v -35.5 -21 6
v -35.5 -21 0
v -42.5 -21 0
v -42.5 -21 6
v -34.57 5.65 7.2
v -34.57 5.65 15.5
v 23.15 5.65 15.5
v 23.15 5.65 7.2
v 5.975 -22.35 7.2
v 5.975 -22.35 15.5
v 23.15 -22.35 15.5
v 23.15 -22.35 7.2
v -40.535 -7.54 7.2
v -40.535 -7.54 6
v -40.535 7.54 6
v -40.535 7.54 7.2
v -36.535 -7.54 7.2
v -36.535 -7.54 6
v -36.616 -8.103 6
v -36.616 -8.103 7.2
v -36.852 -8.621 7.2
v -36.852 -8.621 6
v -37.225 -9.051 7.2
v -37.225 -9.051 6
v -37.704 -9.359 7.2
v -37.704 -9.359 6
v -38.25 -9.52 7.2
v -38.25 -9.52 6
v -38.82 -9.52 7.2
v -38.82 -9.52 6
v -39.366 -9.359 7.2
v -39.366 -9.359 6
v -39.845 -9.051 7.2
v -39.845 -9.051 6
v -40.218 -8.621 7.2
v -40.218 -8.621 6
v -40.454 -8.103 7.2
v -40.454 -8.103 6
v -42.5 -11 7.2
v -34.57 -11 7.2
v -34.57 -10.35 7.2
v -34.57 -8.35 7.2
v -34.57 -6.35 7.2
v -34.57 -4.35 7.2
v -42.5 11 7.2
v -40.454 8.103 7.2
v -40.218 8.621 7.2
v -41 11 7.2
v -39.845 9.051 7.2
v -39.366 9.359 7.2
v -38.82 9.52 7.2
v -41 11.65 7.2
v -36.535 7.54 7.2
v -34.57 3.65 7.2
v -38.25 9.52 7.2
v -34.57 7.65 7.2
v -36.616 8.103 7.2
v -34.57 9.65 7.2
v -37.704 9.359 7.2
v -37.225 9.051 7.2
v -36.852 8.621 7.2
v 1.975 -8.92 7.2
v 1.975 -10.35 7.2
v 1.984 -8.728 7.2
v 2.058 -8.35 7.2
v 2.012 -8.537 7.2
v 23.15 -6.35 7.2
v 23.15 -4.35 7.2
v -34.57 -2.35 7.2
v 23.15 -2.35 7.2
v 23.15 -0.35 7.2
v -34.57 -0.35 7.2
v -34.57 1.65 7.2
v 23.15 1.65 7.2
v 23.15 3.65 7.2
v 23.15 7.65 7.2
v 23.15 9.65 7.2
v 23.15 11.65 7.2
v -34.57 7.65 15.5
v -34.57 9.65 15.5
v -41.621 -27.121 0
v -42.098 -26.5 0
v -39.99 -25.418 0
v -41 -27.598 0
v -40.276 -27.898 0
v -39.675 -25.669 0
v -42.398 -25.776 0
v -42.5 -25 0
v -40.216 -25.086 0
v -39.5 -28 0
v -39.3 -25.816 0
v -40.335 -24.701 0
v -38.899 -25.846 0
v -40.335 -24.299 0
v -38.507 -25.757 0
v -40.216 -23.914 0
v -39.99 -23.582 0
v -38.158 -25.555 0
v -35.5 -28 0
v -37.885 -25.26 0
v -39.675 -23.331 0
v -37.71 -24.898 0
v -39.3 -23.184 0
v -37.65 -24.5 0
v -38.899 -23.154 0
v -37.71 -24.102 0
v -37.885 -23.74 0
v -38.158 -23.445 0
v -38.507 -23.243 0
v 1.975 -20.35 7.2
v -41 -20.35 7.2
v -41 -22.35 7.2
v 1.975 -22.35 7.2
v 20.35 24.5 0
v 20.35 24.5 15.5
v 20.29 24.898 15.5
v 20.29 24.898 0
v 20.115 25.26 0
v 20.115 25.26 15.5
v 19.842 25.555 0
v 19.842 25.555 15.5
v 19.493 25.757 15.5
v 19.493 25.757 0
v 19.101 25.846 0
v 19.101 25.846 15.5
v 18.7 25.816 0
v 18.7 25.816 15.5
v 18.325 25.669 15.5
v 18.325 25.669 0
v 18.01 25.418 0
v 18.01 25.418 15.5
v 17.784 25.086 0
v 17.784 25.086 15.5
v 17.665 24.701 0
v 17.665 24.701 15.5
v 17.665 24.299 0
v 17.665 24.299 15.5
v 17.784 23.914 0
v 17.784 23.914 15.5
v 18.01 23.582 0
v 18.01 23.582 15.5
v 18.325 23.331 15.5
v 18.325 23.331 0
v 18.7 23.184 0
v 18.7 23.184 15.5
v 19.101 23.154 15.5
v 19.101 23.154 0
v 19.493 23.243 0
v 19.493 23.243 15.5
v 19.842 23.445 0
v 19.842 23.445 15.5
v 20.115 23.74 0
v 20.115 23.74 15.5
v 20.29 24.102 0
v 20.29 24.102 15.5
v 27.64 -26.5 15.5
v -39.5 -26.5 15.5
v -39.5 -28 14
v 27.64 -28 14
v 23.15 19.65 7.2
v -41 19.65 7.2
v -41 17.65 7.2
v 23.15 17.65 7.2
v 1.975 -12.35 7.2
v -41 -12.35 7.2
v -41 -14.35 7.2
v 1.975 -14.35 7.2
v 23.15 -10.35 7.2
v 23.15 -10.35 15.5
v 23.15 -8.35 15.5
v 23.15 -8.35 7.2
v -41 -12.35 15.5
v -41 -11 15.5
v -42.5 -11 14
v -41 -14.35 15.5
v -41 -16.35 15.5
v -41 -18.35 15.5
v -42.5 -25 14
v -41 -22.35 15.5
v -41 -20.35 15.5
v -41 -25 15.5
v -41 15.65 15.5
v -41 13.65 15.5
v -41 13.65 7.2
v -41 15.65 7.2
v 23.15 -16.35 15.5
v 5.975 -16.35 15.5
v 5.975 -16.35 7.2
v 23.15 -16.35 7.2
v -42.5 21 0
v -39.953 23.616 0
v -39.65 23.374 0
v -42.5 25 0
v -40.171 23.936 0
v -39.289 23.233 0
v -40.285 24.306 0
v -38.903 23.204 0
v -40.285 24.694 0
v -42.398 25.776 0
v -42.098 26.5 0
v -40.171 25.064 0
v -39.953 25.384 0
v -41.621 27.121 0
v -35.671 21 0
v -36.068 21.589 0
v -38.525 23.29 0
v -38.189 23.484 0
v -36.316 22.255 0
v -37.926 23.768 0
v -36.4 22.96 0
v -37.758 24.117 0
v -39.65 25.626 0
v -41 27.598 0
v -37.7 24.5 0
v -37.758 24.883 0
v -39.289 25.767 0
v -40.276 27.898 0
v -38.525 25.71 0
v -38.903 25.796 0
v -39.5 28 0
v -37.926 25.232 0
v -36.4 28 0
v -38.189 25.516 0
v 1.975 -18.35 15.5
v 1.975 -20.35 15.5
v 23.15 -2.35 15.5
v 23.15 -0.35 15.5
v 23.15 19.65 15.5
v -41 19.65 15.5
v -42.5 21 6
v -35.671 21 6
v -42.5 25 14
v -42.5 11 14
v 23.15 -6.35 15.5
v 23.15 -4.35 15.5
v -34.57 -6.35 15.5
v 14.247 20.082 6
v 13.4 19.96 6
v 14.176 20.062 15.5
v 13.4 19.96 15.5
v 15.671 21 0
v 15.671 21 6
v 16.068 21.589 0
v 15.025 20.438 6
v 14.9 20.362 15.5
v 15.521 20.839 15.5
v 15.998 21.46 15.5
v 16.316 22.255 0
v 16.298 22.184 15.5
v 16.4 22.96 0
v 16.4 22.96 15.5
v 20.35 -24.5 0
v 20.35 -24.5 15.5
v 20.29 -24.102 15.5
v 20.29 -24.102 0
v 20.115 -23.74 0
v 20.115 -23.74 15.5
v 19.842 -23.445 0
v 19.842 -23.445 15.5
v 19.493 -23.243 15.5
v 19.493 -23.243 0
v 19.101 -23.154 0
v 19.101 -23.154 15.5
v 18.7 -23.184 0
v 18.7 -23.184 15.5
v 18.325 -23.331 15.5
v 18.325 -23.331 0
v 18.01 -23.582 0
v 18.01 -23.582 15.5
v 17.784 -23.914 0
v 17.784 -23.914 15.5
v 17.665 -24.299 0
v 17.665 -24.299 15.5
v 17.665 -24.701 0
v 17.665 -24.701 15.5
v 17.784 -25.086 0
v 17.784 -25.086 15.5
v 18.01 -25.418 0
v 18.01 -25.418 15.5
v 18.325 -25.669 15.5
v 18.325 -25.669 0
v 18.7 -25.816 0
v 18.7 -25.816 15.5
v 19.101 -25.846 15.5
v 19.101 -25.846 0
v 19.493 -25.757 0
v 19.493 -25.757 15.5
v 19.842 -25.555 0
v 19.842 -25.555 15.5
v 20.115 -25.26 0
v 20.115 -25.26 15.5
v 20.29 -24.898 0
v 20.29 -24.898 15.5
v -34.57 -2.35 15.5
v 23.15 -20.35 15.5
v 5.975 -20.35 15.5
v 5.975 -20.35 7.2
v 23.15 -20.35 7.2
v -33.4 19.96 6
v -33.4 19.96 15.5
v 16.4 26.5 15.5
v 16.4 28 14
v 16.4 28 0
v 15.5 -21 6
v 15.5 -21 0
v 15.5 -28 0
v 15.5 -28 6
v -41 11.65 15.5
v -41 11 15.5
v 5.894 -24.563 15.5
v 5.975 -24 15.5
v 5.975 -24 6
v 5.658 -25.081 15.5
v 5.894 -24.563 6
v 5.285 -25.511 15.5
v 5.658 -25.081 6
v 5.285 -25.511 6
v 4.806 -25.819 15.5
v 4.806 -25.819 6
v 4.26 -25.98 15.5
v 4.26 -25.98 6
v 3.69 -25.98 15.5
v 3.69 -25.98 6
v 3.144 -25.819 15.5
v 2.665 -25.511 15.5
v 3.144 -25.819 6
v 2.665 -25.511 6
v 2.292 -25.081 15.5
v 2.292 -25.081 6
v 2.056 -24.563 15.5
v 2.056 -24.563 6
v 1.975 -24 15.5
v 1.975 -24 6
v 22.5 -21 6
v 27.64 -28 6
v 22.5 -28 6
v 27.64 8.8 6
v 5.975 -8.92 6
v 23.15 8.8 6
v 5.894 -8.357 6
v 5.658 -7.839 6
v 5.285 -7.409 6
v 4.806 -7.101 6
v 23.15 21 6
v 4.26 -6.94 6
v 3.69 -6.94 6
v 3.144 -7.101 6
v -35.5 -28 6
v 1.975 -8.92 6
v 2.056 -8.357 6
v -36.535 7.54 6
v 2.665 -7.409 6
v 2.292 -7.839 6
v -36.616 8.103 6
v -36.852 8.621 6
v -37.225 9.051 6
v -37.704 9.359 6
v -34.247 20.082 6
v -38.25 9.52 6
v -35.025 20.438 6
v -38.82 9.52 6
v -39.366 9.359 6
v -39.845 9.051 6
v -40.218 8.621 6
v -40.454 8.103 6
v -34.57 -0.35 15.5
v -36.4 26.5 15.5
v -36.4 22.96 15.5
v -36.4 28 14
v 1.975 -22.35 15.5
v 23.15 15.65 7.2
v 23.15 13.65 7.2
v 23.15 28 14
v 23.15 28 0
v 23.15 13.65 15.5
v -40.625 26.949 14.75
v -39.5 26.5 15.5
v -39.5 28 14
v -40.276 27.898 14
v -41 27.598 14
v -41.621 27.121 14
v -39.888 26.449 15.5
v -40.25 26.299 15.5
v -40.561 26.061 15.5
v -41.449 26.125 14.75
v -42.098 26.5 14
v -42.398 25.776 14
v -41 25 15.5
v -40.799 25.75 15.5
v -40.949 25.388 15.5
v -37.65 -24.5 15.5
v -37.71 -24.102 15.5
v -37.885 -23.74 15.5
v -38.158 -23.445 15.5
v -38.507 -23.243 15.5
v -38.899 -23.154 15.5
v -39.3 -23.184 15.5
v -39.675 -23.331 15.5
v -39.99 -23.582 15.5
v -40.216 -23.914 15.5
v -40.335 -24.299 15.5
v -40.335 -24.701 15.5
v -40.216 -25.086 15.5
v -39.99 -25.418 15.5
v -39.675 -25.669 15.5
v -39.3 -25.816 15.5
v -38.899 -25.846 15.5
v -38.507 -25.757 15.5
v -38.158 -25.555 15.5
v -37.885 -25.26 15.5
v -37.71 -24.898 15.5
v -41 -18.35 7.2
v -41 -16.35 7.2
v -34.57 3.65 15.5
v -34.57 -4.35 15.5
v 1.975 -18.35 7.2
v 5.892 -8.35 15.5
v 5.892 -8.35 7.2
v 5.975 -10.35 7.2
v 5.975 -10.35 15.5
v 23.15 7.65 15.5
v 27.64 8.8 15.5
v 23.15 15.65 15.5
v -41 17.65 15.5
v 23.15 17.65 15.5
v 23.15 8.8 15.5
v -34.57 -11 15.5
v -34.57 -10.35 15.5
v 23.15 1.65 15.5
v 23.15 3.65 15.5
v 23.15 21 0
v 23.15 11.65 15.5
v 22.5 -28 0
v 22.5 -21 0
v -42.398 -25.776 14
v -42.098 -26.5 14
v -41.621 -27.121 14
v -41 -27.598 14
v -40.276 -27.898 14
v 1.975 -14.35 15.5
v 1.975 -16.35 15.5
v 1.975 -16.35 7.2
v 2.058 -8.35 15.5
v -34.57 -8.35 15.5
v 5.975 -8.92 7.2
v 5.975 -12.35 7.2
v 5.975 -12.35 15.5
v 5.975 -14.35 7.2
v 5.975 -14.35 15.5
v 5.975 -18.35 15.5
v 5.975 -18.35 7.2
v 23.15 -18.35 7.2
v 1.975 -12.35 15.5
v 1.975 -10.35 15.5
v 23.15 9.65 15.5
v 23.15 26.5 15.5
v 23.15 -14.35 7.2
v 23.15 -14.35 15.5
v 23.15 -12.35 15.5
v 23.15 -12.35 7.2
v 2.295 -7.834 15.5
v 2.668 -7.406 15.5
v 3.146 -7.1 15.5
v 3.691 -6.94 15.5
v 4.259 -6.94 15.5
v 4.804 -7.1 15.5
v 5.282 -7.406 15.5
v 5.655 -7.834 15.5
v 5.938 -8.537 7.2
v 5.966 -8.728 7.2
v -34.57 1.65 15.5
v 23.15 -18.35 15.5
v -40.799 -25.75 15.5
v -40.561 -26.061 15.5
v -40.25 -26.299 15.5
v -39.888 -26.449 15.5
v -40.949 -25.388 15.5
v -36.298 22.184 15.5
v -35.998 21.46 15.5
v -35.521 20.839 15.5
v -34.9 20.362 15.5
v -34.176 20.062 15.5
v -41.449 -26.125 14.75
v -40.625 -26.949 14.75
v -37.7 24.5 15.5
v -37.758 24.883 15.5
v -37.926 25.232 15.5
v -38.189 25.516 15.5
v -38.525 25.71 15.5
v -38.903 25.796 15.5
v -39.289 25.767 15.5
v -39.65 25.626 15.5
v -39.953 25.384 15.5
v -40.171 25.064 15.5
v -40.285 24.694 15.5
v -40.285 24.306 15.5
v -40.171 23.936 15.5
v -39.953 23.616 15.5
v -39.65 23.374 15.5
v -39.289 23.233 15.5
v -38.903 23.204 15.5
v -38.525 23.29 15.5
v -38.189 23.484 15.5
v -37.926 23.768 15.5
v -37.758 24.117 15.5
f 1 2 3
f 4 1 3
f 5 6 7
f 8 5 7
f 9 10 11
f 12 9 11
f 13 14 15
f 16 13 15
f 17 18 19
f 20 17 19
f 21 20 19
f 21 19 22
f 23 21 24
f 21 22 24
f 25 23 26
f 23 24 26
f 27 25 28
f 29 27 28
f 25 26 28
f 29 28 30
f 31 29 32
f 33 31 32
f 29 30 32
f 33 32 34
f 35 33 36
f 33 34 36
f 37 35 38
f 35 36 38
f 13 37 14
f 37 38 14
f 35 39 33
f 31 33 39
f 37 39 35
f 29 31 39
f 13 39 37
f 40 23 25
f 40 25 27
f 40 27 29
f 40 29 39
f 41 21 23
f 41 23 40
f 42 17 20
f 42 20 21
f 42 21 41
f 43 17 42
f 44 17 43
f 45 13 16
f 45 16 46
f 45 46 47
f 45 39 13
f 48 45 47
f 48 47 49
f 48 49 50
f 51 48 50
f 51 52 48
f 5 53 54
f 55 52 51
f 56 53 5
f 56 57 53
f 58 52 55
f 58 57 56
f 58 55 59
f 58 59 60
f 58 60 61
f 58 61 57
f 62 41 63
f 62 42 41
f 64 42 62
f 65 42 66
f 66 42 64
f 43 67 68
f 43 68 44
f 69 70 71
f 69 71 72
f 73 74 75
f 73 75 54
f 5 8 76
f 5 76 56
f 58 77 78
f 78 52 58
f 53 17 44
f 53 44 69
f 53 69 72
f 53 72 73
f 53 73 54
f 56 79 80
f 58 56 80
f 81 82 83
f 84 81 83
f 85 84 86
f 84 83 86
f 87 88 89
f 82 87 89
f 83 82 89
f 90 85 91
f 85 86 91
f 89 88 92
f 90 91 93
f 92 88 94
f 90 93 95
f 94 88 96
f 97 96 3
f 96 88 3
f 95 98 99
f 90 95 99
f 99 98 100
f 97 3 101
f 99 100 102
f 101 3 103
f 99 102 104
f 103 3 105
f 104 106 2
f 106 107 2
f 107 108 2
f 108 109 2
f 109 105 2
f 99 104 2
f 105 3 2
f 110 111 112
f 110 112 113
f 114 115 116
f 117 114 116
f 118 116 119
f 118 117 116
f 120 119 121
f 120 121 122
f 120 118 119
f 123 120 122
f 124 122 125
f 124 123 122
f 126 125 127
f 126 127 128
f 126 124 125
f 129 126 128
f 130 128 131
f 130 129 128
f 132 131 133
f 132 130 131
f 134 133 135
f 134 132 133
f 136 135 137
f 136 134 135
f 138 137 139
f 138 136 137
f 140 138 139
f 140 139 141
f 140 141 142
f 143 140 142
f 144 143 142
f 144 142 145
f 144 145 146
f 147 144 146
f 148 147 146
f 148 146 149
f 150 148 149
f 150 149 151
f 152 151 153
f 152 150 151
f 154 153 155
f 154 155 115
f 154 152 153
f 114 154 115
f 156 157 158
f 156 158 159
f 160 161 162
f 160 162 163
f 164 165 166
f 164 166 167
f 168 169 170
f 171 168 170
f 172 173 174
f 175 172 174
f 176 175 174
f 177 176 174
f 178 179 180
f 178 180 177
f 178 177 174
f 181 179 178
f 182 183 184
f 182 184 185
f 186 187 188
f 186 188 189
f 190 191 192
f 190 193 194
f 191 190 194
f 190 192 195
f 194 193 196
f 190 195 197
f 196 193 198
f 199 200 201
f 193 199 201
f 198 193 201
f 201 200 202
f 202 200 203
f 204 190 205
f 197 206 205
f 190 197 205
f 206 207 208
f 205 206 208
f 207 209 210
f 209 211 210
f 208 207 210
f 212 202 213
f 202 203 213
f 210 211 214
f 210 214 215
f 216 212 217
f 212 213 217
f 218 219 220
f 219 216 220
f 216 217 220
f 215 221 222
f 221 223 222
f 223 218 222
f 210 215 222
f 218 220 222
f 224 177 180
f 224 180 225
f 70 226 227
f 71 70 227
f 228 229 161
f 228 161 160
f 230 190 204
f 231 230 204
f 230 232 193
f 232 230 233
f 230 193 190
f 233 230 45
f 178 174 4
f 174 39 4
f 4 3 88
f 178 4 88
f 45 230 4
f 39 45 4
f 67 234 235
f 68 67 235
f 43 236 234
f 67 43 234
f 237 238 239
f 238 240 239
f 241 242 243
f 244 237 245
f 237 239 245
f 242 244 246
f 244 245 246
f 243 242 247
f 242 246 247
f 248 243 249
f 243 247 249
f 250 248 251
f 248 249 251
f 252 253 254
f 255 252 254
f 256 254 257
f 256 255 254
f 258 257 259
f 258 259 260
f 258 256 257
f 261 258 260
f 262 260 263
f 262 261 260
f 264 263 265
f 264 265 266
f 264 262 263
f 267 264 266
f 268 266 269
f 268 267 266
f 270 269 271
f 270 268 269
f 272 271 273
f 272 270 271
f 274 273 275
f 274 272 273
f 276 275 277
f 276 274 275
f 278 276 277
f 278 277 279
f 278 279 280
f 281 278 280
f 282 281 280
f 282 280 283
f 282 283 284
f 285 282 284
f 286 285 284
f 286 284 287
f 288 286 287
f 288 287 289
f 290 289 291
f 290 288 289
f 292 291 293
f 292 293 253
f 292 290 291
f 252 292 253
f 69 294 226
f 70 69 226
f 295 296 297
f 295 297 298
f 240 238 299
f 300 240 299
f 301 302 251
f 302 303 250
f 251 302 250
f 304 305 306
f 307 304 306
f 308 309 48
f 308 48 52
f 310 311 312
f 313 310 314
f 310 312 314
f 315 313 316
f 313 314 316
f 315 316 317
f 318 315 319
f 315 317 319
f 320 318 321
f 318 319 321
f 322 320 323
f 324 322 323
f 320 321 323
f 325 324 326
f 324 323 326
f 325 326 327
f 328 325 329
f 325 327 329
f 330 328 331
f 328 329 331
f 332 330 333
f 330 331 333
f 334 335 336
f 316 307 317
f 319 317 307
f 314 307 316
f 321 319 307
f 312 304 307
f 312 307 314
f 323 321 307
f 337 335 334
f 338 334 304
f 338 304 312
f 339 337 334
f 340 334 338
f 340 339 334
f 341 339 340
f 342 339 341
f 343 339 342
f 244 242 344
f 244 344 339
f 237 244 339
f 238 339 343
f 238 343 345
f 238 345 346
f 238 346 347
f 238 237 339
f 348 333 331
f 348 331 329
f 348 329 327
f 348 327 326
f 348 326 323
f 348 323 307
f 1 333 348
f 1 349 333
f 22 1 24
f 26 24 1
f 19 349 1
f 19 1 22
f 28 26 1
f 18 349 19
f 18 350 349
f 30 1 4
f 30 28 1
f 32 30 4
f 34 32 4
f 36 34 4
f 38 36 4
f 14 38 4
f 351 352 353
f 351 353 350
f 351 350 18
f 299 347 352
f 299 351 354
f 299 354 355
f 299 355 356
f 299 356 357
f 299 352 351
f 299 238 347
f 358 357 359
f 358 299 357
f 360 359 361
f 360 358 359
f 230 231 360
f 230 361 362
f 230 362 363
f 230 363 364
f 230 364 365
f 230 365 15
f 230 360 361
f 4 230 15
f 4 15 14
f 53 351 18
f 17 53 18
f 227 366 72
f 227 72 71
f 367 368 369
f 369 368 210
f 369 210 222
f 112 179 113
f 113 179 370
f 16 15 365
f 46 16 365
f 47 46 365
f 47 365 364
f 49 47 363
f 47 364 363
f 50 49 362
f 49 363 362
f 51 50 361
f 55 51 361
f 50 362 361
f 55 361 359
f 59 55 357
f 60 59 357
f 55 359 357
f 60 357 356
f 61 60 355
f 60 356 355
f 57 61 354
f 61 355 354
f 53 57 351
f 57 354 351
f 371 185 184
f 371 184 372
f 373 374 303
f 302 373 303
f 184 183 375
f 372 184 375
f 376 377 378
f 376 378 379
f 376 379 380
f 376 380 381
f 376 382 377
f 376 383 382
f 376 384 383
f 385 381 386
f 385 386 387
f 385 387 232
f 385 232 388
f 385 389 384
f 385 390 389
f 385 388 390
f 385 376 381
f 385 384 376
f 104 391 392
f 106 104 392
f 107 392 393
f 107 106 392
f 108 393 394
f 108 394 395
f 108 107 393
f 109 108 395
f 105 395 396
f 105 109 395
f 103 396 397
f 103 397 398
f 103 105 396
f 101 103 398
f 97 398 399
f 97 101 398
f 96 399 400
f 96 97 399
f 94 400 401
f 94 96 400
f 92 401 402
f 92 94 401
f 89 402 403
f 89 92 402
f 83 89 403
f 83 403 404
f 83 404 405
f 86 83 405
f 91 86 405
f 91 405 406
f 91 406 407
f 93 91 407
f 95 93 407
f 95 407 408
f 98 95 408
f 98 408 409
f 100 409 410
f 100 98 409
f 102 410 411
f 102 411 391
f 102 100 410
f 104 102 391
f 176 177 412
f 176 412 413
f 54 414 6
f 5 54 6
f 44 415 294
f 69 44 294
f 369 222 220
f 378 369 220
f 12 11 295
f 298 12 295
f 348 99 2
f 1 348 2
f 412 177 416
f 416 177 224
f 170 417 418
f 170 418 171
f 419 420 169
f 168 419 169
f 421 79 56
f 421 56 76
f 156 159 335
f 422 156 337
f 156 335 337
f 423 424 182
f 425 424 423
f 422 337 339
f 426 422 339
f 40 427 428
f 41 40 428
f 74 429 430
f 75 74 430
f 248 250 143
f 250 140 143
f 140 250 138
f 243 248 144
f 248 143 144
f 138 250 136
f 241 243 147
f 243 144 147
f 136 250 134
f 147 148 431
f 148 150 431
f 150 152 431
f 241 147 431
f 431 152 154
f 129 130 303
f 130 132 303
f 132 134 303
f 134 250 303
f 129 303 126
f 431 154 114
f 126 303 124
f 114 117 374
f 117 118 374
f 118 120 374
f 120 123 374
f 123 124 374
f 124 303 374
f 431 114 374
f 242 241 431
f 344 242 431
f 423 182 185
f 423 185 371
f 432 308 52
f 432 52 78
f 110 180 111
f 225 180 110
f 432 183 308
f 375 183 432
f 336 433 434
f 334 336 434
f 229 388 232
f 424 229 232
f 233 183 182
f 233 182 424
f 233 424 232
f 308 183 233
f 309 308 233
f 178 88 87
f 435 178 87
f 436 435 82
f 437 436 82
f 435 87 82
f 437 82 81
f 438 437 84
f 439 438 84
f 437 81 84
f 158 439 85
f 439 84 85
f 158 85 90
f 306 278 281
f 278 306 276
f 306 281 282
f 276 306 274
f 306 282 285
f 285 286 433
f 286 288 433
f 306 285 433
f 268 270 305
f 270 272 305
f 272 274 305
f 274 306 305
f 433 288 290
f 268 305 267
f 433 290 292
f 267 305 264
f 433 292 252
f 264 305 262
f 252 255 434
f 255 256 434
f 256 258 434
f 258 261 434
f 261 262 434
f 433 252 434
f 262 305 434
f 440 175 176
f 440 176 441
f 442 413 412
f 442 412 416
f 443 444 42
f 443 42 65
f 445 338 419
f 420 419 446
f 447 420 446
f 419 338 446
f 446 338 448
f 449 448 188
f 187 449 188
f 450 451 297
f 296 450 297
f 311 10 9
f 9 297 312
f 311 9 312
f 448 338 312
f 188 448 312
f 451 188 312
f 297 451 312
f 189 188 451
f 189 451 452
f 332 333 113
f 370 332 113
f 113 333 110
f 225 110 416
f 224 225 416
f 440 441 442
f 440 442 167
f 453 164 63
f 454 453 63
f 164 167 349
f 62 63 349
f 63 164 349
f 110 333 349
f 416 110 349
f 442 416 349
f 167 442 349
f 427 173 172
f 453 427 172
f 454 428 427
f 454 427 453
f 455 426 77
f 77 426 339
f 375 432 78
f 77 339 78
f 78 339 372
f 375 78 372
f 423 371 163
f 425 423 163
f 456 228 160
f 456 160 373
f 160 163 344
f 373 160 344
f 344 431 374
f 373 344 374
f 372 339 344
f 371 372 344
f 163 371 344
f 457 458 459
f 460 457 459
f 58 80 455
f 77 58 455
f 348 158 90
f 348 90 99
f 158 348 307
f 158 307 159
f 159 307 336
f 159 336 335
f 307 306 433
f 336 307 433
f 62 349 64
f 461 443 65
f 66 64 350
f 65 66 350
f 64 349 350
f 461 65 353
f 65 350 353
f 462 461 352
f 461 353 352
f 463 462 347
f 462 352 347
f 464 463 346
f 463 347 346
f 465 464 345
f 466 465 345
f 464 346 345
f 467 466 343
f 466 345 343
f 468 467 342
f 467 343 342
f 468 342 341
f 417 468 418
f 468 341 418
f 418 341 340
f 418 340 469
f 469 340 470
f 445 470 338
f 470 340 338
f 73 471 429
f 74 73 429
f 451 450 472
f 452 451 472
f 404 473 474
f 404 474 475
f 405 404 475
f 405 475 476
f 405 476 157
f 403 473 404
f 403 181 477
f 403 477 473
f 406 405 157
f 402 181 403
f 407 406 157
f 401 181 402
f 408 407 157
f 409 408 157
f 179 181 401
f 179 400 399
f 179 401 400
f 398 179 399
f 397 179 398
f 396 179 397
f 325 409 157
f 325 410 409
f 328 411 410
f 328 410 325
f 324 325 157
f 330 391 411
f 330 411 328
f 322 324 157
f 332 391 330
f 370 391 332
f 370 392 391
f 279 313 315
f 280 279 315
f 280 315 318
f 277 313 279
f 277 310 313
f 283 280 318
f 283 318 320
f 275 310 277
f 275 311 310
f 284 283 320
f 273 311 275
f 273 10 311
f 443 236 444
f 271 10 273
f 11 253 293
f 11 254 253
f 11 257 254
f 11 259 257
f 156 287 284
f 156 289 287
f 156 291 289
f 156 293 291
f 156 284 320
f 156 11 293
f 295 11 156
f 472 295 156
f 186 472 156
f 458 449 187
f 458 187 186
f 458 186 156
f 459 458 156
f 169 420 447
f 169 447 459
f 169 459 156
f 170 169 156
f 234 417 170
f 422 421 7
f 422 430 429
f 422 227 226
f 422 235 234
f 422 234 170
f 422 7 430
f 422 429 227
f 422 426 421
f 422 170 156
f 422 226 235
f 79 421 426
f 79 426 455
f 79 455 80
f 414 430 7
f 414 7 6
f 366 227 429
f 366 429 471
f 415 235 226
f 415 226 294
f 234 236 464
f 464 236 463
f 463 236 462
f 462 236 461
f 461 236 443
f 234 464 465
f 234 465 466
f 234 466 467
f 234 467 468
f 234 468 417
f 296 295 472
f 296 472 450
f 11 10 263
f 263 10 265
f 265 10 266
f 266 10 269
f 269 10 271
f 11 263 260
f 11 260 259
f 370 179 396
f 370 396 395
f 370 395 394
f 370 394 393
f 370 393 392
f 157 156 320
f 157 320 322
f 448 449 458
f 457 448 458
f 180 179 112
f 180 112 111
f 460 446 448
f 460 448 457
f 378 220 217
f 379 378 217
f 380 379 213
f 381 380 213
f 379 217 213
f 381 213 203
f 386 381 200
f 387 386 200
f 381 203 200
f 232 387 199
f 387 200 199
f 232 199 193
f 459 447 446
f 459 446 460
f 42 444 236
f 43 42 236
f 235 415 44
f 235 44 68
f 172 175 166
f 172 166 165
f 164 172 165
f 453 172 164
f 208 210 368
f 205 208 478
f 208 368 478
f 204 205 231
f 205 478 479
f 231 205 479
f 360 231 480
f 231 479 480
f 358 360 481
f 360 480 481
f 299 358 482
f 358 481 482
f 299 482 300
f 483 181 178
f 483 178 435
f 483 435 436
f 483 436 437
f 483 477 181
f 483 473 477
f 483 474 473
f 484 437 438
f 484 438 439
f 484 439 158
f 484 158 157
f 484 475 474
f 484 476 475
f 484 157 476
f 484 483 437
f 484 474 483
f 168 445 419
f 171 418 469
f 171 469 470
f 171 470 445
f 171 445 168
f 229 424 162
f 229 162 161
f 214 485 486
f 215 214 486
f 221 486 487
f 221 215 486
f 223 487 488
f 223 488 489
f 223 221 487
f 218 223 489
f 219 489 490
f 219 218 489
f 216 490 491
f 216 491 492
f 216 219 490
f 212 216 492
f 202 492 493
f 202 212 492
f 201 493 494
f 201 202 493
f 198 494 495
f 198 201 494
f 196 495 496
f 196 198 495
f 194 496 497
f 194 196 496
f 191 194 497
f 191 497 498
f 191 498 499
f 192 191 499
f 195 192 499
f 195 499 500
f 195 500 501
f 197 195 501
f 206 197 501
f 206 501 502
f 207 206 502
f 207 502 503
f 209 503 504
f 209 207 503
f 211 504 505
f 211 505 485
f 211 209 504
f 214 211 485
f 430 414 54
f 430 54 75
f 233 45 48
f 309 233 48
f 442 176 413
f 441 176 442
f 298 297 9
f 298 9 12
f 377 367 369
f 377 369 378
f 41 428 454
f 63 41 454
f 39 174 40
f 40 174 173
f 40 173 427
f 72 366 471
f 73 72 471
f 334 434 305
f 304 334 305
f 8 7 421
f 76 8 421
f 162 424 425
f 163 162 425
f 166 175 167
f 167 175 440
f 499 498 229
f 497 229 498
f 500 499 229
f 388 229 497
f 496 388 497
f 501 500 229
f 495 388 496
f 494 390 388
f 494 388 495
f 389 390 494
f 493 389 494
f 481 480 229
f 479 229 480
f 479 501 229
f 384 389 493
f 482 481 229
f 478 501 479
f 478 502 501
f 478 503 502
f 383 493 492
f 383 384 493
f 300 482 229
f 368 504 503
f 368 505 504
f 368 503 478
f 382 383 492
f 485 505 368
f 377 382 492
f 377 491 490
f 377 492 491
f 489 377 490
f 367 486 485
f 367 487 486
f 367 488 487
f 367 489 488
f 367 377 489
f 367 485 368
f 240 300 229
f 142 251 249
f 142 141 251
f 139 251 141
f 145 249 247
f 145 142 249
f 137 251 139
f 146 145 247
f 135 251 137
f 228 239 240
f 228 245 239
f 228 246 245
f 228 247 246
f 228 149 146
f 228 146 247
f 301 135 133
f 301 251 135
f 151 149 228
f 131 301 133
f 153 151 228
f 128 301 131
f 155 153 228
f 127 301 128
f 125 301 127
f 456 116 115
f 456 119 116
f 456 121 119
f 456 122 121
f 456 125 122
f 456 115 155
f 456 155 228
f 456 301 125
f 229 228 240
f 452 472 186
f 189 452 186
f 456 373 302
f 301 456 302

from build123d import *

# Parameters (mm, degrees)
SKETCH1_R           = 1.35
SKETCH1_R_2         = 1.3
BOSS_EXTRUDE1_DEPTH = 15.5
CUT_EXTRUDE1_DEPTH  = 6
FILLET1_R           = 3
CHAMFER1_SIZE       = 1.5
SKETCH3_W           = 7.93
SKETCH3_H           = 22
CUT_EXTRUDE2_DEPTH  = 8.3
SKETCH4_W           = 64.15
SKETCH4_H           = 2
CUT_EXTRUDE3_DEPTH  = 8.3


with BuildPart() as part:
    # Sketch1 → Boss-Extrude1 (new body)
    with BuildSketch(Plane.XY):
        with BuildLine():
            Line((-36.4, 19.96), (-36.4, 28))
            Line((-36.4, 28), (-39.5, 28))
            ThreePointArc((-39.5, 28), (-41.621320344, 27.121320344), (-42.5, 25))
            Line((-42.5, 25), (-42.5, -25))
            ThreePointArc((-42.5, -25), (-41.621320344, -27.121320344), (-39.5, -28))
            Line((-39.5, -28), (27.64, -28))
            Line((27.64, -28), (27.64, 8.8))
            Line((27.64, 8.8), (23.15, 8.8))
            Line((23.15, 8.8), (23.15, 28))
            Line((23.15, 28), (16.4, 28))
            Line((16.4, 28), (16.4, 21.51))
            Line((16.4, 21.51), (22.004438923, 21.51))
            Line((22.004438923, 21.51), (22.004438923, 15.51))
            Line((22.004438923, 15.51), (16.004438923, 15.51))
            Line((16.004438923, 15.51), (16.004438923, 19.96))
            Line((16.004438923, 19.96), (-36.4, 19.96))
        make_face()
        with Locations((-39, -24.5)):
            Circle(SKETCH1_R, mode=Mode.SUBTRACT)
        with Locations((19, -24.5)):
            Circle(SKETCH1_R, mode=Mode.SUBTRACT)
        with BuildLine():
            ThreePointArc((1.975, -8.92), (3.975, -6.92), (5.975, -8.92))
            Line((5.975, -8.92), (5.975, -24))
            ThreePointArc((5.975, -24), (3.975, -26), (1.975, -24))
            Line((1.975, -24), (1.975, -8.92))
        make_face(mode=Mode.SUBTRACT)
        with BuildLine():
            ThreePointArc((-40.535, 7.54), (-38.535, 9.54), (-36.535, 7.54))
            Line((-36.535, 7.54), (-36.535, -7.54))
            ThreePointArc((-36.535, -7.54), (-38.535, -9.54), (-40.535, -7.54))
            Line((-40.535, -7.54), (-40.535, 7.54))
        make_face(mode=Mode.SUBTRACT)
        with Locations((-39, 24.5)):
            Circle(SKETCH1_R_2, mode=Mode.SUBTRACT)
        with Locations((19, 24.5)):
            Circle(SKETCH1_R, mode=Mode.SUBTRACT)
        Polygon((22.004438923, 21.51), (16.4, 21.51), (16.4, 19.96), (16.004438923, 19.96), (16.004438923, 15.51), (22.004438923, 15.51), align=None)
    extrude(amount=BOSS_EXTRUDE1_DEPTH)

    # Sketch2 → Cut-Extrude1 (cut)
    with BuildSketch(Plane(origin=(0, 0, 0), x_dir=(-1, 0, 0), z_dir=(0, 0, -1))):
        Polygon((-16.4, 19.96), (-16.4, 21), (-23.15, 21), (-23.15, 8.8), (-27.64, 8.8), (-27.64, -28), (-22.5, -28), (-22.5, -21), (-15.5, -21), (-15.5, -28), (35.5, -28), (35.5, -21), (42.5, -21), (42.5, 21), (36.4, 21), (36.4, 19.96), align=None)
        with BuildLine():
            Line((-1.975, -8.92), (-1.975, -24))
            ThreePointArc((-1.975, -24), (-3.975, -26), (-5.975, -24))
            Line((-5.975, -24), (-5.975, -8.92))
            ThreePointArc((-5.975, -8.92), (-3.975, -6.92), (-1.975, -8.92))
        make_face(mode=Mode.SUBTRACT)
        with BuildLine():
            Line((40.535, 7.54), (40.535, -7.54))
            ThreePointArc((40.535, -7.54), (38.535, -9.54), (36.535, -7.54))
            Line((36.535, -7.54), (36.535, 7.54))
            ThreePointArc((36.535, 7.54), (38.535, 9.54), (40.535, 7.54))
        make_face(mode=Mode.SUBTRACT)
    extrude(amount=-CUT_EXTRUDE1_DEPTH, mode=Mode.SUBTRACT)

    # Fillet1
    fillet1_edges = [part.edges().sort_by_distance(p)[0] for p in [
        (-36.4, 19.96, 10.75),
        (16.4, 19.96, 10.75),
    ]]
    fillet(fillet1_edges, radius=FILLET1_R)

    # Chamfer1
    chamfer1_edges = [part.edges().sort_by_distance(p)[0] for p in [
        (-37.95, 28, 15.5),
        (-41.621320344, 27.121320344, 15.5),
        (-42.5, 0, 15.5),
        (-41.621320344, -27.121320344, 15.5),
        (-5.93, -28, 15.5),
        (19.775, 28, 15.5),
    ]]
    chamfer(chamfer1_edges, length=CHAMFER1_SIZE)

    # Sketch3 → Cut-Extrude2 (cut)
    with BuildSketch(Plane.XY.offset(15.5)):
        with Locations((-38.535, 0)):
            Rectangle(SKETCH3_W, SKETCH3_H)
    extrude(amount=-CUT_EXTRUDE2_DEPTH, mode=Mode.SUBTRACT)

    # Sketch4 → Cut-Extrude3 (cut)
    with BuildSketch(Plane.XY.offset(15.5)):
        with Locations((-8.925, 18.65)):
            Rectangle(SKETCH4_W, SKETCH4_H)
        with Locations((-8.925, 14.65)):
            Rectangle(SKETCH4_W, SKETCH4_H)
        with Locations((-8.925, 10.65)):
            Rectangle(SKETCH4_W, SKETCH4_H)
        with Locations((-8.925, 6.65)):
            Rectangle(SKETCH4_W, SKETCH4_H)
        with Locations((-8.925, 2.65)):
            Rectangle(SKETCH4_W, SKETCH4_H)
        with Locations((-8.925, -1.35)):
            Rectangle(SKETCH4_W, SKETCH4_H)
        with Locations((-8.925, -5.35)):
            Rectangle(SKETCH4_W, SKETCH4_H)
        with Locations((-8.925, -9.35)):
            Rectangle(SKETCH4_W, SKETCH4_H)
        with Locations((-8.925, -13.35)):
            Rectangle(SKETCH4_W, SKETCH4_H)
        with Locations((-8.925, -17.35)):
            Rectangle(SKETCH4_W, SKETCH4_H)
        with Locations((-8.925, -21.35)):
            Rectangle(SKETCH4_W, SKETCH4_H)
    extrude(amount=-CUT_EXTRUDE3_DEPTH, mode=Mode.SUBTRACT)


solid = part.part
